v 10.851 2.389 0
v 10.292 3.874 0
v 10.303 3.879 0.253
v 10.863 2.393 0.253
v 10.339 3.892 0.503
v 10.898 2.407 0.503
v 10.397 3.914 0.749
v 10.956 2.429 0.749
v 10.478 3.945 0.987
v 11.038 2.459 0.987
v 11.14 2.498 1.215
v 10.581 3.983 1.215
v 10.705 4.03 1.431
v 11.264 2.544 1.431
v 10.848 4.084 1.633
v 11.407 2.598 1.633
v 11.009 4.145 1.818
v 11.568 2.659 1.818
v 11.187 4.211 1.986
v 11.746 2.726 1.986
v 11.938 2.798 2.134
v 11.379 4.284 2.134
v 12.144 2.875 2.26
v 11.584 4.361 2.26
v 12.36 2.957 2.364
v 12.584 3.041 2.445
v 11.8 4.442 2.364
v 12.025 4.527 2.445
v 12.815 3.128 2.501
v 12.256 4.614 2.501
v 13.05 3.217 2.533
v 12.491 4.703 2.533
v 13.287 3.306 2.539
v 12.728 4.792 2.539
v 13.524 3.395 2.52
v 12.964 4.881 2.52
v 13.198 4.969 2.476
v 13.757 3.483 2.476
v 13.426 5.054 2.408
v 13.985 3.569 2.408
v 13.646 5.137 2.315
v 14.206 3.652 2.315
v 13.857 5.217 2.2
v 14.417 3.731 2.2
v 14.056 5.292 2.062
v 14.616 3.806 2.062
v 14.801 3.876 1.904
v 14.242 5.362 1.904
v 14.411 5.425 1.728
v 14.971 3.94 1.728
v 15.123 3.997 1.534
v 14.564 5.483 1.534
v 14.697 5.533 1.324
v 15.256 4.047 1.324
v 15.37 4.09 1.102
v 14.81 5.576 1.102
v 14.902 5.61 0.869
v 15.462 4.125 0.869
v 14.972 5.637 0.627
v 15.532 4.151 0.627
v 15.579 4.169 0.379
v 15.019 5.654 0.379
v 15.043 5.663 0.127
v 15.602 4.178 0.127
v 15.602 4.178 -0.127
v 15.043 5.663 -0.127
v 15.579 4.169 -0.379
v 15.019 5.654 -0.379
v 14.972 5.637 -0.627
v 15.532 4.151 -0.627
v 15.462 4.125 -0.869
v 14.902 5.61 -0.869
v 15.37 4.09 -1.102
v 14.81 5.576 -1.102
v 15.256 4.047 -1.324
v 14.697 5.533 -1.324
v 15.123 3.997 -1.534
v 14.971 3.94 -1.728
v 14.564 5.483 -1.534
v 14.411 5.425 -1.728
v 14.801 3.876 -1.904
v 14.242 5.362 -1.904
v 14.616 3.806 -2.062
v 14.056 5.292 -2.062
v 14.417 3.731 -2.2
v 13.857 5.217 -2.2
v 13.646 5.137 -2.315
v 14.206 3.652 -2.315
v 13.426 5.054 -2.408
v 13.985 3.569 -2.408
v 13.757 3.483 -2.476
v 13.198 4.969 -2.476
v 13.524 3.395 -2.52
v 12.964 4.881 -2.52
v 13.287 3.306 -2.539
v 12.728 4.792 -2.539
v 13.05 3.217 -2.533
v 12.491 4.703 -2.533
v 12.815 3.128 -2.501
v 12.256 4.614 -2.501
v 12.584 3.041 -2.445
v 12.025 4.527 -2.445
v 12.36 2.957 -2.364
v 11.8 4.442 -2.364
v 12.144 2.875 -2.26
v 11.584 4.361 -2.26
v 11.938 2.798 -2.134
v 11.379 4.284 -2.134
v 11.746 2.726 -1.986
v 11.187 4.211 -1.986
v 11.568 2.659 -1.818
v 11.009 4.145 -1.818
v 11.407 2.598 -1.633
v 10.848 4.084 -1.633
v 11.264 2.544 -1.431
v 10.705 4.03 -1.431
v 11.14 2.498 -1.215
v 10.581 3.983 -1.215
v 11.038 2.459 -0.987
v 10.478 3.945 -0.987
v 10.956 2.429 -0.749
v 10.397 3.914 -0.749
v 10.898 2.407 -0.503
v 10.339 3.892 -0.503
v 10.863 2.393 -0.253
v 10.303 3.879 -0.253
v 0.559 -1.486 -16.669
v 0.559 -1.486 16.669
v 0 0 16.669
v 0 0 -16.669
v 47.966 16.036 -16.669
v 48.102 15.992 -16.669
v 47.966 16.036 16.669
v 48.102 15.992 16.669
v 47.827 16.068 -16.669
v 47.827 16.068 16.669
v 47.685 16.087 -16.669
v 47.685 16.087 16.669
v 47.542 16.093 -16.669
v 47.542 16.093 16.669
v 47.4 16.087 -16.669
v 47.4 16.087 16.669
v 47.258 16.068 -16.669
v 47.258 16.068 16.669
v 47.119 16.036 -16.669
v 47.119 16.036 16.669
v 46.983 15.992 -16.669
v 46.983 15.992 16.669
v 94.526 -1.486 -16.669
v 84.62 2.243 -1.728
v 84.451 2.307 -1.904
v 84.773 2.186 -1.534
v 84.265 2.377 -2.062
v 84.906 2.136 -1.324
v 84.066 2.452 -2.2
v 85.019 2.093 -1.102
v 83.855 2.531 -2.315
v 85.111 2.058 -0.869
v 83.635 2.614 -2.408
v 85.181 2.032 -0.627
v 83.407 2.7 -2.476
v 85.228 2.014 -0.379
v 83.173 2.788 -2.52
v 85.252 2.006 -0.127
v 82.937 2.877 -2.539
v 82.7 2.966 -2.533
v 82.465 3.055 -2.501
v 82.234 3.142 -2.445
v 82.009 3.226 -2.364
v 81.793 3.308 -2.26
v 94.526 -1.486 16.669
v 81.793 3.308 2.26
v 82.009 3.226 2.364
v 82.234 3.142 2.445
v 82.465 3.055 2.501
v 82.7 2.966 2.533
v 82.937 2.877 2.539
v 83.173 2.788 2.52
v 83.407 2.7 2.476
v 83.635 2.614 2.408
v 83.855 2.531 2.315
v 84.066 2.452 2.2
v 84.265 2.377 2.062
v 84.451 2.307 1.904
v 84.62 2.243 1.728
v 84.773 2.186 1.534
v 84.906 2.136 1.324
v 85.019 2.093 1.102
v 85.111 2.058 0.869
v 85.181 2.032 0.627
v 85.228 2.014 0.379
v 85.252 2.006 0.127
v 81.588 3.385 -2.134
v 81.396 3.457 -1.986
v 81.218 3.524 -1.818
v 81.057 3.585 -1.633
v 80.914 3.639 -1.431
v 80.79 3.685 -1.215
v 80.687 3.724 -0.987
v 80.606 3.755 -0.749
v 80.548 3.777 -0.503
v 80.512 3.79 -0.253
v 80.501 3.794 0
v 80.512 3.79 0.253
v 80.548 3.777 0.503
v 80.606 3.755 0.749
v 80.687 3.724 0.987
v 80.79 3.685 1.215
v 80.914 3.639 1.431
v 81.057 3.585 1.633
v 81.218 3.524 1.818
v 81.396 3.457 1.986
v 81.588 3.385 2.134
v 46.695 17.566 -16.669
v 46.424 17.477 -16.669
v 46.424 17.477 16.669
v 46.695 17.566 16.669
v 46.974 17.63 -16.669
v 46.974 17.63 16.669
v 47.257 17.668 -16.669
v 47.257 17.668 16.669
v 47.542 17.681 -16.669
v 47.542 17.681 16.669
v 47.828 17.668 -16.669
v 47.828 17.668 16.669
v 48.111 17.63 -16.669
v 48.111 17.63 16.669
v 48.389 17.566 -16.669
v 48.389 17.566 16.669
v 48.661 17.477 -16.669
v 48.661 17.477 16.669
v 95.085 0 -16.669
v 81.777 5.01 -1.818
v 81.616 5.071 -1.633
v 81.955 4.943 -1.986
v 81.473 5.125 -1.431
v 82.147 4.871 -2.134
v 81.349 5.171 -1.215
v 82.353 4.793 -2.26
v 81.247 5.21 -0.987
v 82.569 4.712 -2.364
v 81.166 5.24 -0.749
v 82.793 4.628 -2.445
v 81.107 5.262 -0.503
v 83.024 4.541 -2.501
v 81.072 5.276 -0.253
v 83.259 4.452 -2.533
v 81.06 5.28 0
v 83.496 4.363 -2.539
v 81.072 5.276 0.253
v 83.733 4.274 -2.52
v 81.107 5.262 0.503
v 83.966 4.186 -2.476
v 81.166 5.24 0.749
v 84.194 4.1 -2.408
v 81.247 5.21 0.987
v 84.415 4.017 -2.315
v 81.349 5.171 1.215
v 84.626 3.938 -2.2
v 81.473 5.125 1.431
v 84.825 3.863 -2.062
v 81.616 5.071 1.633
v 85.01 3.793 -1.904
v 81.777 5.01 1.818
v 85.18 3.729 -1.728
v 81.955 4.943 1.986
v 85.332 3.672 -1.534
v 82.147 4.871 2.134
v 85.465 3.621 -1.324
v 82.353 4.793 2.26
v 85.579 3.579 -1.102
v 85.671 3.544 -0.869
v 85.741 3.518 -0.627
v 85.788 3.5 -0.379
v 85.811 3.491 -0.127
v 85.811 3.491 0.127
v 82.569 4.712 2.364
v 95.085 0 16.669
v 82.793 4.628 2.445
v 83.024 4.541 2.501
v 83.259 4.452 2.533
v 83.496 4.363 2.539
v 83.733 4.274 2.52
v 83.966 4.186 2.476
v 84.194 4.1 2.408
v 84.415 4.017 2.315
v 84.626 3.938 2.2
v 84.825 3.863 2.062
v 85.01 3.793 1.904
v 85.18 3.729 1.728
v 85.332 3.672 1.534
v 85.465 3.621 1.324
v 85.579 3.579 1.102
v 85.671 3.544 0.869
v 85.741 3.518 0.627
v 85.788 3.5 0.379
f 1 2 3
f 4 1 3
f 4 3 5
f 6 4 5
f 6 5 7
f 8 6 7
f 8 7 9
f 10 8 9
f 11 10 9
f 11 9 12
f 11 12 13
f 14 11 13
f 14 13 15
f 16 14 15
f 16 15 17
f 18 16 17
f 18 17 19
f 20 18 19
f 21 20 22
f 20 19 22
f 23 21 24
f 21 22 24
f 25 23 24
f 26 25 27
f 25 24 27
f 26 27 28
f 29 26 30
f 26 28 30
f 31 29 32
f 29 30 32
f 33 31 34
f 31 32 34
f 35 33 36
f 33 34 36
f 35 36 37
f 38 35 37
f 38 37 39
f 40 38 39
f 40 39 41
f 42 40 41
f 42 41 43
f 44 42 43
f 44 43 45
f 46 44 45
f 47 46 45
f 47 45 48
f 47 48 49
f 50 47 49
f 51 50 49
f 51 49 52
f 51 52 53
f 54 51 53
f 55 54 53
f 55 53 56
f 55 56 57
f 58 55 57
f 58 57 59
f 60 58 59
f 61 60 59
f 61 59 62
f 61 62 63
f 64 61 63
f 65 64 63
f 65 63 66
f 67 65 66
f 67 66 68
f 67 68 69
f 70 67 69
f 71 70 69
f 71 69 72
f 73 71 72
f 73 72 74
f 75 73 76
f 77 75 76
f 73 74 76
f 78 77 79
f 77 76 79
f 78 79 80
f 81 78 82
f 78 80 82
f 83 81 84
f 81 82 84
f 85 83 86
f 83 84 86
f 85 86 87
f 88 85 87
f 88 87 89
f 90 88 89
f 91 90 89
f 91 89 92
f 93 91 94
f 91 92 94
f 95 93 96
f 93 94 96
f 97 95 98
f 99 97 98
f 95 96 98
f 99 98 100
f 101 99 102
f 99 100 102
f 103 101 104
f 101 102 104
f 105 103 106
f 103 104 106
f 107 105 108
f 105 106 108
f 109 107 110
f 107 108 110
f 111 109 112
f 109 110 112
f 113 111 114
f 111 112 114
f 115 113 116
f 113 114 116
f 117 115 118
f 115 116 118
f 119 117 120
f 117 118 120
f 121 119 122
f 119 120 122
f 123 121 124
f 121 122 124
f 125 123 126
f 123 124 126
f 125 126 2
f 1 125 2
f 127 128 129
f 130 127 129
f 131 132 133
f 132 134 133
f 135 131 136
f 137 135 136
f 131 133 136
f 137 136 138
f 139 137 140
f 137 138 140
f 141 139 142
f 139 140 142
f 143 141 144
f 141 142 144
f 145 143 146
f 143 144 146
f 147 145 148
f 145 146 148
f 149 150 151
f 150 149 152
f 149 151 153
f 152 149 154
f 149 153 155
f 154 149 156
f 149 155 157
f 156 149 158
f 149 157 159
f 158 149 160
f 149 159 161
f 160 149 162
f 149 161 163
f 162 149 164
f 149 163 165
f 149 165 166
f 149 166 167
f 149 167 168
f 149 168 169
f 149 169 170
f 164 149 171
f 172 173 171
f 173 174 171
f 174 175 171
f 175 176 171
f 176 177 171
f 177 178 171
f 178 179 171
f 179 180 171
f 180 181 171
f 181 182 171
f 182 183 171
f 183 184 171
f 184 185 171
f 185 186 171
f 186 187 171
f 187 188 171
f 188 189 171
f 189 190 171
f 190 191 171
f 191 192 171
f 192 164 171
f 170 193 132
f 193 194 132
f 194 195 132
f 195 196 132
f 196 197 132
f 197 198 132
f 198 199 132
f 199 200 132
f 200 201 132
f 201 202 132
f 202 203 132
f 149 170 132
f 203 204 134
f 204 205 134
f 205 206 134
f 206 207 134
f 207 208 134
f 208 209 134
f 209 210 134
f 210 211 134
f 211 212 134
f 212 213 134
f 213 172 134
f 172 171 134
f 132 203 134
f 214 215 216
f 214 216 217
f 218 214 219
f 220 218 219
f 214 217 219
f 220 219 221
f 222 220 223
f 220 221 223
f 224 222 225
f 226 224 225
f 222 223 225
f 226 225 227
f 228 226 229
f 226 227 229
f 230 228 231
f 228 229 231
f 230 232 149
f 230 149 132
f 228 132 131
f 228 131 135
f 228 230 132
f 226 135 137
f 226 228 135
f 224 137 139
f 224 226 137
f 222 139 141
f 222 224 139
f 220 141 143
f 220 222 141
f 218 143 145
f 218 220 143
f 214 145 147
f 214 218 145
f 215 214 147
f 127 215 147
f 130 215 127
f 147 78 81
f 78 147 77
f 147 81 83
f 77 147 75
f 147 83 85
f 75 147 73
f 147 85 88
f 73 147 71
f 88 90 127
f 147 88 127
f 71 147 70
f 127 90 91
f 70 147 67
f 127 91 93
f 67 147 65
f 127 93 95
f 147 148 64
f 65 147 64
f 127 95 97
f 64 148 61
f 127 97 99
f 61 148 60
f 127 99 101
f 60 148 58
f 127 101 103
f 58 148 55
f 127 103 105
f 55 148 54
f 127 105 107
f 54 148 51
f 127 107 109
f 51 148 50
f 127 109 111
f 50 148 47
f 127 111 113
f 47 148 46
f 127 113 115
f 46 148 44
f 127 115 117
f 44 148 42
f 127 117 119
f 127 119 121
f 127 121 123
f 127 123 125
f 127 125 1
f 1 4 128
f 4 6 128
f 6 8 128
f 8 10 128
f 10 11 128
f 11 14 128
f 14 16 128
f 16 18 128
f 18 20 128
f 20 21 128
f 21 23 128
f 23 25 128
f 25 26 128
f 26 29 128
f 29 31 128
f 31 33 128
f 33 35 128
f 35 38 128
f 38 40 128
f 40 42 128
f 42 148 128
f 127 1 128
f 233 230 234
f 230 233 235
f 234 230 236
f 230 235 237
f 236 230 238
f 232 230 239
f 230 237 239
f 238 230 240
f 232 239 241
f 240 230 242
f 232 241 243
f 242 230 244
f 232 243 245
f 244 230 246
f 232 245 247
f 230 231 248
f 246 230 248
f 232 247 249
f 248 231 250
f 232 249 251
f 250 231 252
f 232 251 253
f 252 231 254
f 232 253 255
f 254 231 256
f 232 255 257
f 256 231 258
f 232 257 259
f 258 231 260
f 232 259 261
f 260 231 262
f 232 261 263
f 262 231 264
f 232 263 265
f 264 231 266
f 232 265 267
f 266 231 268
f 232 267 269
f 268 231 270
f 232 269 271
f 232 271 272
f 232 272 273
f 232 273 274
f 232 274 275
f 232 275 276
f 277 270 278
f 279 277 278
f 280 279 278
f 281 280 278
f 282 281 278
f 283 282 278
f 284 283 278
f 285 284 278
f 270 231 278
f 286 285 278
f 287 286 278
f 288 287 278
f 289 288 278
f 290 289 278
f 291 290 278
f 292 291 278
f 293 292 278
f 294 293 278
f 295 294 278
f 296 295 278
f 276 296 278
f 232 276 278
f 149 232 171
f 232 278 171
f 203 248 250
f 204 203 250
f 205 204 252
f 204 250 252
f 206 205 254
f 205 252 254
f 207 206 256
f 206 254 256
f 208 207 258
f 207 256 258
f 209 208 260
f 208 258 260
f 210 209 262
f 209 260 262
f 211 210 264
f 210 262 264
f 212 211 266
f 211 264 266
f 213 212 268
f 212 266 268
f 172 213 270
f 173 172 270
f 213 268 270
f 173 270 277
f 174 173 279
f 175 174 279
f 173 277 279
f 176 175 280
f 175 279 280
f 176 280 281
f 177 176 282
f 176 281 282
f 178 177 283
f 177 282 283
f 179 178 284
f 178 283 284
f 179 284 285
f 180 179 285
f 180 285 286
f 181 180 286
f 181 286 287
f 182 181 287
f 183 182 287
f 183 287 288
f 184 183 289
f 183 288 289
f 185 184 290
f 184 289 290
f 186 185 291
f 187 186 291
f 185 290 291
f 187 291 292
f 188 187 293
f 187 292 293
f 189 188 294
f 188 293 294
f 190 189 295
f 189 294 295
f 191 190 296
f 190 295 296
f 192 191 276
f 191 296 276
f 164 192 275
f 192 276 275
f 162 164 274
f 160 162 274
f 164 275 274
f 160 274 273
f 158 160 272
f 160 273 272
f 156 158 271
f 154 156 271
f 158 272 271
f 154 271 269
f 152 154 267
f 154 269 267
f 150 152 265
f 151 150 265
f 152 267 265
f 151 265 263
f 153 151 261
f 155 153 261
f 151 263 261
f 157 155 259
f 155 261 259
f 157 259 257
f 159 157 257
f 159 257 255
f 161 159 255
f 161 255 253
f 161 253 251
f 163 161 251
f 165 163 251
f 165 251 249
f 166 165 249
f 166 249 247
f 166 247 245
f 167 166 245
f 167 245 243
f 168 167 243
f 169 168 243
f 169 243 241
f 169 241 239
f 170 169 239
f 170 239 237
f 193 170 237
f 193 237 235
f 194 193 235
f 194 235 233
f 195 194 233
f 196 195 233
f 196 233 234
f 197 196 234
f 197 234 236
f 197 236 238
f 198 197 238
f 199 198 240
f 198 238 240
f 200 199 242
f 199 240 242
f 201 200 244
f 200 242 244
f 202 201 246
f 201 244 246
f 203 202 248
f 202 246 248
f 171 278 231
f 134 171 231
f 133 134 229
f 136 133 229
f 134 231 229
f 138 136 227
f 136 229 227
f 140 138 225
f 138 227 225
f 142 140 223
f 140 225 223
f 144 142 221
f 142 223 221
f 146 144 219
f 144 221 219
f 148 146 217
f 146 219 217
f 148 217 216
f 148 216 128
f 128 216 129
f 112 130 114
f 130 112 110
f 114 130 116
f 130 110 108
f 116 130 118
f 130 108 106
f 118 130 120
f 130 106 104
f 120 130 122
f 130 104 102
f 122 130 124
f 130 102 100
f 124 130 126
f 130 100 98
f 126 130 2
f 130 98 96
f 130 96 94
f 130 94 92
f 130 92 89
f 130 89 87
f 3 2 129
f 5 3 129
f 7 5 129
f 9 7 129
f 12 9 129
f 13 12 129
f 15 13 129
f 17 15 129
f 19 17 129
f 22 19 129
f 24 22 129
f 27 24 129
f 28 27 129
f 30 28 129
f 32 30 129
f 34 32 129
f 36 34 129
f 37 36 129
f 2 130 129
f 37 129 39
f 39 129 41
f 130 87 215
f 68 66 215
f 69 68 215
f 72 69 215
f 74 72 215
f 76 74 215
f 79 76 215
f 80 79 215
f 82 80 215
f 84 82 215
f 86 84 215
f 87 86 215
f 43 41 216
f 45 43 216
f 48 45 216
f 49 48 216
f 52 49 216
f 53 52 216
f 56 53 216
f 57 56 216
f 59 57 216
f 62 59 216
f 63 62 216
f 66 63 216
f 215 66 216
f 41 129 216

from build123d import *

# Parameters (mm, degrees)
BASE_FLANGE1_DEPTH = 16.66875
SKETCH2_R          = 2.54
CUT_EXTRUDE1_DEPTH = 2.54
SKETCH3_R          = 2.54
CUT_EXTRUDE2_DEPTH = 1.5875


# Sheet-metal steps are written as plain solids
with BuildPart() as part:
    # Sketch1 → Base-Flange1 (new, symmetric)
    with BuildSketch(Plane.XY):
        with BuildLine():
            Line((0, 0), (46.423806115, 17.477308657))
            ThreePointArc((46.423806115, 17.477308657), (47.542459326, 17.680904949), (48.661112536, 17.477308657))
            Line((48.661112536, 17.477308657), (95.084918652, 0))
            Line((95.084918652, 0), (94.525592046, -1.485701854))
            Line((94.525592046, -1.485701854), (48.101785931, 15.991606803))
            ThreePointArc((48.101785931, 15.991606803), (47.542459326, 16.093404949), (46.983132721, 15.991606803))
            Line((46.983132721, 15.991606803), (0.559326605, -1.485701854))
            Line((0.559326605, -1.485701854), (0, 0))
        make_face()
    extrude(amount=BASE_FLANGE1_DEPTH, both=True)

    # Sketch2 → Cut-Extrude1 (cut)
    with BuildSketch(Plane(origin=(0, 0, 0), x_dir=(0.9358751835780662, 0.3523317197794163, 0), z_dir=(-0.3523317197794163, 0.9358751835780662, 0))):
        with Locations(Location((13.536698287, 0, 0), (0, 0, 180))):
            Circle(SKETCH2_R)
    extrude(amount=-CUT_EXTRUDE1_DEPTH, mode=Mode.SUBTRACT)

    # Sketch3 → Cut-Extrude2 (cut)
    with BuildSketch(Plane(origin=(11.803617474, 31.353159678, 0), x_dir=(0.9358751835780662, -0.3523317197794163, 0), z_dir=(0.3523317197794163, 0.9358751835780662, 0))):
        with Locations(Location((76.541615699, 0, 0), (0, 0, 180))):
            Circle(SKETCH3_R)
    extrude(amount=-CUT_EXTRUDE2_DEPTH, mode=Mode.SUBTRACT)


solid = part.part
